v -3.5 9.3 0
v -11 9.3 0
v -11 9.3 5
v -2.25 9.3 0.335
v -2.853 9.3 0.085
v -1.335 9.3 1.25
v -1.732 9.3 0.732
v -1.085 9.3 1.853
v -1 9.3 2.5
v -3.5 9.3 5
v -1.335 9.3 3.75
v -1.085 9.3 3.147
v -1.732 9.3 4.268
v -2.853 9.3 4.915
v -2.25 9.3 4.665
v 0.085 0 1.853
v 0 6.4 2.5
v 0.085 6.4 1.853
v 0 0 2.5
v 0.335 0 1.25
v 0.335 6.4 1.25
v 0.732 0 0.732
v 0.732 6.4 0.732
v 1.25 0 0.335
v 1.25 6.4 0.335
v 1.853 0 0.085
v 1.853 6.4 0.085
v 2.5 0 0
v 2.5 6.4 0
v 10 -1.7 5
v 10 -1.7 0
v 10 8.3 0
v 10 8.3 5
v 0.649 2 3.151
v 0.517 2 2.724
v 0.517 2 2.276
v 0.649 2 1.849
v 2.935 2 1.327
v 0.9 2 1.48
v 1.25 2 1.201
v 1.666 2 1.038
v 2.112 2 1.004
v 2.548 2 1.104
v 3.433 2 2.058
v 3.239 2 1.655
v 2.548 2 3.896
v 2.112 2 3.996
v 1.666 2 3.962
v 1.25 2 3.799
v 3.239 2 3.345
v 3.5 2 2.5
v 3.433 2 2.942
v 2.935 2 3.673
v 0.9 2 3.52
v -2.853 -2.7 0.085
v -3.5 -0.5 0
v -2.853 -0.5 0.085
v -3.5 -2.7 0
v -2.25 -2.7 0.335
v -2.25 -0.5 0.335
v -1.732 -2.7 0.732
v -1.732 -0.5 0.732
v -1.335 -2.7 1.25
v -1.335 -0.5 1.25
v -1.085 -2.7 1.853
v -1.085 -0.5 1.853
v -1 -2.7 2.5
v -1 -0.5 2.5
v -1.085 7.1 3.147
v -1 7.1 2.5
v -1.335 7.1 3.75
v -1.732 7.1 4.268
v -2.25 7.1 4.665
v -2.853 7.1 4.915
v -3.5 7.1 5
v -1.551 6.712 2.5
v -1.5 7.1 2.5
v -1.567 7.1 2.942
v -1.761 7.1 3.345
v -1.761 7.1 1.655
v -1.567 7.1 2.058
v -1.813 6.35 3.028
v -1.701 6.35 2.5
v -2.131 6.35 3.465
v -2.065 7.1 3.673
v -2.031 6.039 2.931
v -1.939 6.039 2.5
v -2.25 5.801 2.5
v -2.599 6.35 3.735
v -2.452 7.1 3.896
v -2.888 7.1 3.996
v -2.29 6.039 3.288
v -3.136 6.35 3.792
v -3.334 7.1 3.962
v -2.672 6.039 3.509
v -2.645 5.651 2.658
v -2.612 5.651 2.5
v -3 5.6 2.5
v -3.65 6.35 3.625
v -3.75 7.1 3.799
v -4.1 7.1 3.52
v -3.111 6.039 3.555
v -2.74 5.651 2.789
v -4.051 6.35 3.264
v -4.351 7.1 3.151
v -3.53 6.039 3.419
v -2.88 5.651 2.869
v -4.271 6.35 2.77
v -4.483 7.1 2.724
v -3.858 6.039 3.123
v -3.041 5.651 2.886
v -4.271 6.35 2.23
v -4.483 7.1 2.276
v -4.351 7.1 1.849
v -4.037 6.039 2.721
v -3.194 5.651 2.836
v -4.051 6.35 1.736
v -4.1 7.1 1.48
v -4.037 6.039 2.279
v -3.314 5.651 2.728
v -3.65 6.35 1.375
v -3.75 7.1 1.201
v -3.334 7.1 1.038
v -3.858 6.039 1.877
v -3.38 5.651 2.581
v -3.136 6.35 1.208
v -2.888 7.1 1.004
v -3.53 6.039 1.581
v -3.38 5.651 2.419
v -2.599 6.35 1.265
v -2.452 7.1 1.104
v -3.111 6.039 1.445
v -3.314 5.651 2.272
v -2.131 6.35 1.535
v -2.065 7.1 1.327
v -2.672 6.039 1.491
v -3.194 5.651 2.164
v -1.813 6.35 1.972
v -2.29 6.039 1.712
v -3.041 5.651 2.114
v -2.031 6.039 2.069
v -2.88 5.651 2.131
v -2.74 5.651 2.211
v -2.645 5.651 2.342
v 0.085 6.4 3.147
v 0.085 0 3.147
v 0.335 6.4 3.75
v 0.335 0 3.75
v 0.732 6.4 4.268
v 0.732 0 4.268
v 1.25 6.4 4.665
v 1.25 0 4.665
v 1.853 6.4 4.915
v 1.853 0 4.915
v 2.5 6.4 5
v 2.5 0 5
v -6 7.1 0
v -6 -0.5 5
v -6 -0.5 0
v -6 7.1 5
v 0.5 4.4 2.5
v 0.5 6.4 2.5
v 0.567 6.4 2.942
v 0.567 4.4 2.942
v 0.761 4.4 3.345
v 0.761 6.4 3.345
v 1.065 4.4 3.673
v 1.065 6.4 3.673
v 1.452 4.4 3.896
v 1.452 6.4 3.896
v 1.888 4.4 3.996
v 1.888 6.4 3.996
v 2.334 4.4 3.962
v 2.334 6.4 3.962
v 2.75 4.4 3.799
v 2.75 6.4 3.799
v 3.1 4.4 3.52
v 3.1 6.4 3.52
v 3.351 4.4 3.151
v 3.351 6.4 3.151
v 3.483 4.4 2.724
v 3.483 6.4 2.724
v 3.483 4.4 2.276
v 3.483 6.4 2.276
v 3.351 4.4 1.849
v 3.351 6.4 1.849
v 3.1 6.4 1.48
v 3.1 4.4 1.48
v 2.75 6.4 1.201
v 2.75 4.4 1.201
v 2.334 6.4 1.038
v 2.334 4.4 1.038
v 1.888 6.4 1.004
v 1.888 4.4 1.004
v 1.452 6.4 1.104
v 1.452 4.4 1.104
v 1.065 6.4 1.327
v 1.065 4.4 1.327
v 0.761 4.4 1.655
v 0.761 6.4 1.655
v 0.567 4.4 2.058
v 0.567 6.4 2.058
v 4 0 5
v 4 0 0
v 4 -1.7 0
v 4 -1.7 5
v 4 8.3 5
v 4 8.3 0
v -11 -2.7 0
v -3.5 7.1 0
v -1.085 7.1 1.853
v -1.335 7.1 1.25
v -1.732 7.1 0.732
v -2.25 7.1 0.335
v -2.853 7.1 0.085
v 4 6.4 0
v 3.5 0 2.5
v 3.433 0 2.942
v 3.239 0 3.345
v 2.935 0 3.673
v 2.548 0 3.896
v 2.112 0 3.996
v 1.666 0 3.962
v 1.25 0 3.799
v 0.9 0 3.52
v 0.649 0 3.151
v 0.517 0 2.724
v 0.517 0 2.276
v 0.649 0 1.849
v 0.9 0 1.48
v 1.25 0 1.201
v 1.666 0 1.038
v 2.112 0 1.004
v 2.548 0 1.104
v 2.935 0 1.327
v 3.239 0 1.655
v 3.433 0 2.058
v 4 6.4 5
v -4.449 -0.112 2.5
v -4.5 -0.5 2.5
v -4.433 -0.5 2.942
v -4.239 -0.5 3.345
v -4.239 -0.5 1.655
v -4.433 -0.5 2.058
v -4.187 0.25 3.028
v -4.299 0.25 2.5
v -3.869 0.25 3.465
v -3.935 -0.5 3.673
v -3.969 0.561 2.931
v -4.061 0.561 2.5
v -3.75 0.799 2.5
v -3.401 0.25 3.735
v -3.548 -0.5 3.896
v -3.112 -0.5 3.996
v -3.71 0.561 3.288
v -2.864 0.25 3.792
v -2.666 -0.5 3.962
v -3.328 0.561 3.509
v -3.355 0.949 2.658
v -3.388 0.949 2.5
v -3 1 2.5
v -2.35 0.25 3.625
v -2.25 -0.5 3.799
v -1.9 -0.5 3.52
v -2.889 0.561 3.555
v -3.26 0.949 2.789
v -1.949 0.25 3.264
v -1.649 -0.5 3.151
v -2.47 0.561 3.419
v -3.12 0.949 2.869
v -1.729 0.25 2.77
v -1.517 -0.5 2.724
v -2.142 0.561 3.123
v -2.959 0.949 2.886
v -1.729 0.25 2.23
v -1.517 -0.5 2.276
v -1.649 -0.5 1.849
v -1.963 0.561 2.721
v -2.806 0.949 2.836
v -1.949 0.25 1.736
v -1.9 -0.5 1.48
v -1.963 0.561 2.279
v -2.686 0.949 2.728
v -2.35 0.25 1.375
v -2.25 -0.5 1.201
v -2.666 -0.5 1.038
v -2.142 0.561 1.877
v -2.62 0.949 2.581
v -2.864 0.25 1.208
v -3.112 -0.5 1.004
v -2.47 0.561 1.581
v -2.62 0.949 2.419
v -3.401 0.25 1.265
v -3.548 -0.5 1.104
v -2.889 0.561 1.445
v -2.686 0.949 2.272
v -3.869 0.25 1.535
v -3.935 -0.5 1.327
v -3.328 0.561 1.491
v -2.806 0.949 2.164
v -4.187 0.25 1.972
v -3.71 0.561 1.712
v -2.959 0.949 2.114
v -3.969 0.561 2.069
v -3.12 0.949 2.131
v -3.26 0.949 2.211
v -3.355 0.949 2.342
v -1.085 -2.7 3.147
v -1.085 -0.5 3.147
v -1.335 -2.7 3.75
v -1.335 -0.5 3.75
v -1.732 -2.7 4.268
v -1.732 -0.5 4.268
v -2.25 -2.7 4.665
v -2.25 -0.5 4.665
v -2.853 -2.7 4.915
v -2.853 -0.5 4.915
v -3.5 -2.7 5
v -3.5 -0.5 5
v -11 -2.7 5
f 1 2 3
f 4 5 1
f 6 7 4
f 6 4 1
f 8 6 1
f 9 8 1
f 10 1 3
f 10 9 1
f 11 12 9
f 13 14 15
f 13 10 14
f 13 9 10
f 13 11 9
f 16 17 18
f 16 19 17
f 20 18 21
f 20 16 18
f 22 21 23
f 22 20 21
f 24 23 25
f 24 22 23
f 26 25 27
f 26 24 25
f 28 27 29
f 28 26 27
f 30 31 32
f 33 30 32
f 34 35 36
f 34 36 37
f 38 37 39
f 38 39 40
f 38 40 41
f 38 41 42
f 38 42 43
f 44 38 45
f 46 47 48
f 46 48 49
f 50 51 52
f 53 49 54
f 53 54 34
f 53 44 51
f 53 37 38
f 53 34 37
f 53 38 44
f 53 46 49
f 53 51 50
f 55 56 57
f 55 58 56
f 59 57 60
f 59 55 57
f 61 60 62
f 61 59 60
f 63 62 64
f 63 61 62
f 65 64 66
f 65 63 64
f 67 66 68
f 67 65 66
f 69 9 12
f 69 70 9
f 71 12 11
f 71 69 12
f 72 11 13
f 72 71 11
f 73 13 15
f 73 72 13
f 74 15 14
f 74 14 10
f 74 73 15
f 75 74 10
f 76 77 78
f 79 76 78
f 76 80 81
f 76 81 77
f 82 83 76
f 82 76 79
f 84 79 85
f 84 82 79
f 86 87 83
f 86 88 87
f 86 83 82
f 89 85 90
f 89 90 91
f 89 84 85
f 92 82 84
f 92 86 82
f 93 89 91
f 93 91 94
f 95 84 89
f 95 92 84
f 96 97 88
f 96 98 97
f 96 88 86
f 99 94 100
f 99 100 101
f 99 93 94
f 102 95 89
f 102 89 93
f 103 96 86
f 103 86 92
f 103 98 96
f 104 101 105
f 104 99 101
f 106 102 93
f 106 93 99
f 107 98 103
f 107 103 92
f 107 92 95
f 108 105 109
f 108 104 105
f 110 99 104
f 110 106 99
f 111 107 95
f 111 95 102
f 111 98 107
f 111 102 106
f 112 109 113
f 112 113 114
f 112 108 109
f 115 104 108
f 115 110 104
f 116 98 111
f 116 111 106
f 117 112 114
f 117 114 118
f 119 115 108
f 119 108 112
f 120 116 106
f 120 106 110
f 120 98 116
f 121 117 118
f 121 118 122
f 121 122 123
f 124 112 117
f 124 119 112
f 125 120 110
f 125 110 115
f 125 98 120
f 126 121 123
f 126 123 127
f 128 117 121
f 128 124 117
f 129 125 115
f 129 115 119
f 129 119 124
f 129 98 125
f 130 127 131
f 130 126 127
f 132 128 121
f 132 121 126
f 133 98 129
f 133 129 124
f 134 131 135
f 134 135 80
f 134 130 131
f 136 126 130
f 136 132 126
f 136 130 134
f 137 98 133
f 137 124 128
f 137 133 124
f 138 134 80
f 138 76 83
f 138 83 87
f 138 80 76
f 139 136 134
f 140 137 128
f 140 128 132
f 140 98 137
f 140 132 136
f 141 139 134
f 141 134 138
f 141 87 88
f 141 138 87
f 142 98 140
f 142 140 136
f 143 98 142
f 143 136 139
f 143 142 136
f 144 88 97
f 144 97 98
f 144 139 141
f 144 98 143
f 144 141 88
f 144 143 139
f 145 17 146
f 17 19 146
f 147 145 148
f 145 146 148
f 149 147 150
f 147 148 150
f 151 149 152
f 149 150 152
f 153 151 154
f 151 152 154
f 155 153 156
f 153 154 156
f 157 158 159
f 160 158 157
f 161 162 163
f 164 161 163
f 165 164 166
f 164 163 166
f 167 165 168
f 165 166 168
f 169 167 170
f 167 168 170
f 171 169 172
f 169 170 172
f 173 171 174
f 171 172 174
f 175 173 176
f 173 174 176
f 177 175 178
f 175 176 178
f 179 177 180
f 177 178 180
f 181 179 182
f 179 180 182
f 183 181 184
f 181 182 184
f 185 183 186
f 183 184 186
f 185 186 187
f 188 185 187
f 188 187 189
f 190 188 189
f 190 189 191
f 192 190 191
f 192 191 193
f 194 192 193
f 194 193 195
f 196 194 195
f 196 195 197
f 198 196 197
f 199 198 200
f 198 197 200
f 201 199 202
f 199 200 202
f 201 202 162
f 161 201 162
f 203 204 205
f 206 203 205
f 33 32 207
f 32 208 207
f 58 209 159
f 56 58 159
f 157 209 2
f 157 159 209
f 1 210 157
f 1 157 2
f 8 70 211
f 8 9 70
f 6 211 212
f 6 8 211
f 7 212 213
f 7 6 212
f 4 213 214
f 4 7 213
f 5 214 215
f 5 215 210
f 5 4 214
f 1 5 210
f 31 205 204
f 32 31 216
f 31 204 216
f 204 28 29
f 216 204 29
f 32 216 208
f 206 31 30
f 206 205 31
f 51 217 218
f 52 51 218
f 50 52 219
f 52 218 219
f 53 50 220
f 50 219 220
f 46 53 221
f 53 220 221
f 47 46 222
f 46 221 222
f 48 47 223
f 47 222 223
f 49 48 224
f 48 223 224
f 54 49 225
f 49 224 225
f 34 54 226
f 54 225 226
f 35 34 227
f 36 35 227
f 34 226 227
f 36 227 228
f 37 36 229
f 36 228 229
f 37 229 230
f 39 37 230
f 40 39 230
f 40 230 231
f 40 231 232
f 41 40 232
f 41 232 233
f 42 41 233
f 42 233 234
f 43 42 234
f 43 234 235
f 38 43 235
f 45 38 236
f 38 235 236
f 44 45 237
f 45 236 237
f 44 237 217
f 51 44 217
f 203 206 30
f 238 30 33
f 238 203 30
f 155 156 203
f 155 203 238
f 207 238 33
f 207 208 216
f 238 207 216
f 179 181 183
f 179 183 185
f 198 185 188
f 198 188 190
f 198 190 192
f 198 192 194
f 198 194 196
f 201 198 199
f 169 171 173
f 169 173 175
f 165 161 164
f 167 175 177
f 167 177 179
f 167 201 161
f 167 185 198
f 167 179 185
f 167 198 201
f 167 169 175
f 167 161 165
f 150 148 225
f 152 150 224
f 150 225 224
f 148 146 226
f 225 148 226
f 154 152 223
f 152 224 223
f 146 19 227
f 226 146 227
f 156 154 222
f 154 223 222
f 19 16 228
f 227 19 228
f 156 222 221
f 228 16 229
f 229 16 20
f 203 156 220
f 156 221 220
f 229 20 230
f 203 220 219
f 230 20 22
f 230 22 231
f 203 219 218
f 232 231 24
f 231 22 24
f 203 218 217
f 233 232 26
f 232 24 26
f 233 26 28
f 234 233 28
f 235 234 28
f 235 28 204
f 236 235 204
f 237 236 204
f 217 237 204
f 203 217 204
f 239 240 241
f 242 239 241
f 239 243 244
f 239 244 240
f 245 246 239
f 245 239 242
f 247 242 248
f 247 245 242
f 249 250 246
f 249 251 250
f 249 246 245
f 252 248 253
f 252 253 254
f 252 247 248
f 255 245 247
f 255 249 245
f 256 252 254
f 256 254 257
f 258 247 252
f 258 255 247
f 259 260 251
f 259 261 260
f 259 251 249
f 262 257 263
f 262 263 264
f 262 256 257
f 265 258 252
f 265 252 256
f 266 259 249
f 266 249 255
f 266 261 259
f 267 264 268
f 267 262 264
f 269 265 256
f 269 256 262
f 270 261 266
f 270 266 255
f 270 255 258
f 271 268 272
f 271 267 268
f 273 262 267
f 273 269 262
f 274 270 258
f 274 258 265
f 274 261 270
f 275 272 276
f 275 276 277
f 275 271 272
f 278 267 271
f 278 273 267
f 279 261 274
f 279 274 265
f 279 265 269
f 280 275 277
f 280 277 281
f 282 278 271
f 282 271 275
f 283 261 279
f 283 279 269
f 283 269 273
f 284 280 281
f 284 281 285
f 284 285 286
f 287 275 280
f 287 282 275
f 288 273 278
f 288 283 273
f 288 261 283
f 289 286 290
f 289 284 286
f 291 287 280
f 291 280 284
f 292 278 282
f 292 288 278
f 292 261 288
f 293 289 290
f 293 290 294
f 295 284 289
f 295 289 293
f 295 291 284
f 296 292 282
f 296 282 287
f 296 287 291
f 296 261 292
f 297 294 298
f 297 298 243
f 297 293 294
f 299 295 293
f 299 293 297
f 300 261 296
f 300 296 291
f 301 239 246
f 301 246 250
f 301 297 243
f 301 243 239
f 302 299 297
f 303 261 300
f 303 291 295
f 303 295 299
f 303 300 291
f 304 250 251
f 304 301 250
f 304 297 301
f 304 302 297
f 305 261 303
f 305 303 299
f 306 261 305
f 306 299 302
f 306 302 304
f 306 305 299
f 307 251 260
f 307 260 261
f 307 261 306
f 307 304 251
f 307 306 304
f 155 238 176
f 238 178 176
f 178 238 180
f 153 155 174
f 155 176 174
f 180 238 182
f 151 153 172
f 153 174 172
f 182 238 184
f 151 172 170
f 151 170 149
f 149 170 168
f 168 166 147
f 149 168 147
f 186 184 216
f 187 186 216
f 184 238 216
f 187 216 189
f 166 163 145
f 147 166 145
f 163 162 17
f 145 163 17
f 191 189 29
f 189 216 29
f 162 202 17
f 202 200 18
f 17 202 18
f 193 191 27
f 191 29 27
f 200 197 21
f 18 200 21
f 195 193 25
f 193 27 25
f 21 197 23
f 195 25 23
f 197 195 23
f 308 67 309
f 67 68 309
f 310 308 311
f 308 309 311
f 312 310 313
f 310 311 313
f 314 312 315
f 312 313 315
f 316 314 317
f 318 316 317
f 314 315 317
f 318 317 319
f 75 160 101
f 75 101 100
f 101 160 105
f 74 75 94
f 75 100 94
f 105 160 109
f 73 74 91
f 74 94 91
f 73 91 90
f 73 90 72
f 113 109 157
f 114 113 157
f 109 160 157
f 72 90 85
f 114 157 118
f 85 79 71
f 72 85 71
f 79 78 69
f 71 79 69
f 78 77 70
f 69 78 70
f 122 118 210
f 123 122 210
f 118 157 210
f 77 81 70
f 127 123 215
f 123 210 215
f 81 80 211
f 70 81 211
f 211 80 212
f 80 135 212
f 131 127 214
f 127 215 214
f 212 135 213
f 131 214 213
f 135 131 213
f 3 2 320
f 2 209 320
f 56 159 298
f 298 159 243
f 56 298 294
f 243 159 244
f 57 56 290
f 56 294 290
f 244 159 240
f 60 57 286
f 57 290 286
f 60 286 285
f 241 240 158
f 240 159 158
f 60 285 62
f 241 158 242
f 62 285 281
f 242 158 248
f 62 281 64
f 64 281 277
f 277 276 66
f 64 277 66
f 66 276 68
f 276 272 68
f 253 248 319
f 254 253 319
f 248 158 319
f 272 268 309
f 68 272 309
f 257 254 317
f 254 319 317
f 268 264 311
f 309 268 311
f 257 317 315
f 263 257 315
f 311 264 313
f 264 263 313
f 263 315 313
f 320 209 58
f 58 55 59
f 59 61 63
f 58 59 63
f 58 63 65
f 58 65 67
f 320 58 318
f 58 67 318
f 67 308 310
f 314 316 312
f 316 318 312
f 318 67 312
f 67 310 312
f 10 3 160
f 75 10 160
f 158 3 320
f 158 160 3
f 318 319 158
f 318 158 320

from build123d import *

# Parameters (mm, degrees)
F1_DEPTH  = 5
F2_R      = 1.5
F3_DEPTH  = 1.5
F4_R      = 1.5
F5_DEPTH  = 2
F6_R      = 1.5
F7_DEPTH  = 1.5
F8_R      = 1.49999
F9_W      = 1
F9_H      = 7.6
F10_DEPTH = 5
F11_DEPTH = 1
F12_DEPTH = 1
F13_R     = 2.49999
F13_2_R   = 2.49999
F14_DEPTH = 2
F15_DEPTH = 2
F16_R     = 1.5
F17_DEPTH = 2


# Not quite as in the source:
# - a fillet or chamfer is up to 0.001 mm smaller than in the source, because OpenCascade refuses the exact size


with BuildPart() as f1:
    # F0 (on Top) → F1 (new body)
    with BuildSketch(Plane.XY):
        Polygon((0, 6.4), (0, 0), (4, 0), (4, -1.7), (8, -1.7), (8, 8.3), (4, 8.3), (4, 6.4), align=None)
    extrude(amount=F1_DEPTH)

    # F4 (on face) → F5 (cut)
    with BuildSketch(Plane(origin=(0, 6.4, 0), x_dir=(-1, 0, 0), z_dir=(0, 1, 0))):
        with Locations((-2, 2.5)):
            Circle(F4_R)
    extrude(amount=-F5_DEPTH, mode=Mode.SUBTRACT)

    # F13 (radius 2.5 in the source; OpenCascade refuses exactly that, so slightly less here)
    f13_edges = [f1.edges().sort_by_distance(p)[0] for p in [
        (0, 3.2, 5),
        (0, 3.2, 0),
    ]]
    fillet(f13_edges, radius=F13_R)

    # F14 (add): a face of the model
    f14_faces = [f1.faces().sort_by_distance(p)[0] for p in [
        (8, 3.3, 2.5),
    ]]
    extrude(f14_faces, amount=F14_DEPTH)

    # F16 (on face) → F17 (cut)
    with BuildSketch(Plane.XZ):
        with Locations((2, 2.5)):
            Circle(F16_R)
    extrude(amount=-F17_DEPTH, mode=Mode.SUBTRACT)


with BuildPart() as f1b:
    # F0 (on Top) → F1, piece 2 (new body)
    with BuildSketch(Plane.XY):
        Polygon((-5, 7.1), (-1, 7.1), (-1, 8.3), (-9, 8.3), (-9, -1.7), (-1, -1.7), (-1, -0.5), (-5, -0.5), align=None)
    extrude(amount=F1_DEPTH)

    # F2 (on face) → F3 (join)
    with BuildSketch(Plane.XZ.offset(-7.1)):
        with Locations((-3, 2.5)):
            Circle(F2_R)
    extrude(amount=F3_DEPTH)

    # F6 (on face) → F7 (join)
    with BuildSketch(Plane(origin=(0, -0.5, 0), x_dir=(-1, 0, 0), z_dir=(0, 1, 0))):
        with Locations((3, 2.5)):
            Circle(F6_R)
    extrude(amount=F7_DEPTH)

    # F8 (radius 1.5 in the source; OpenCascade refuses exactly that, so slightly less here)
    f8_edges = [f1b.edges().sort_by_distance(p)[0] for p in [
        (-1.5, 1, 2.5),
        (-4.5, 5.6, 2.5),
    ]]
    fillet(f8_edges, radius=F8_R)

    # F9 (on face) → F10 (cut, through all)
    with BuildSketch(Plane.XY.offset(5)):
        with Locations((-5.5, 3.3)):
            Rectangle(F9_W, F9_H)
    extrude(amount=-F10_DEPTH, mode=Mode.SUBTRACT)

    # F11 (add): a face of the model
    f11_faces = [f1b.faces().sort_by_distance(p)[0] for p in [
        (-5, -1.7, 2.5),
    ]]
    extrude(f11_faces, amount=F11_DEPTH)

    # F12 (add): a face of the model
    f12_faces = [f1b.faces().sort_by_distance(p)[0] for p in [
        (-5, 8.3, 2.5),
    ]]
    extrude(f12_faces, amount=F12_DEPTH)

    # F13#2 (radius 2.5 in the source; OpenCascade refuses exactly that, so slightly less here)
    f13_2_edges = [f1b.edges().sort_by_distance(p)[0] for p in [
        (-1, -1.6, 0),
        (-1, -1.6, 5),
        (-1, 8.2, 5),
        (-1, 8.2, 0),
    ]]
    fillet(f13_2_edges, radius=F13_2_R)

    # F15 (add): a face of the model
    f15_faces = [f1b.faces().sort_by_distance(p)[0] for p in [
        (-9, 3.3, 2.5),
    ]]
    extrude(f15_faces, amount=F15_DEPTH)


solid = Compound([f1.part, f1b.part])
